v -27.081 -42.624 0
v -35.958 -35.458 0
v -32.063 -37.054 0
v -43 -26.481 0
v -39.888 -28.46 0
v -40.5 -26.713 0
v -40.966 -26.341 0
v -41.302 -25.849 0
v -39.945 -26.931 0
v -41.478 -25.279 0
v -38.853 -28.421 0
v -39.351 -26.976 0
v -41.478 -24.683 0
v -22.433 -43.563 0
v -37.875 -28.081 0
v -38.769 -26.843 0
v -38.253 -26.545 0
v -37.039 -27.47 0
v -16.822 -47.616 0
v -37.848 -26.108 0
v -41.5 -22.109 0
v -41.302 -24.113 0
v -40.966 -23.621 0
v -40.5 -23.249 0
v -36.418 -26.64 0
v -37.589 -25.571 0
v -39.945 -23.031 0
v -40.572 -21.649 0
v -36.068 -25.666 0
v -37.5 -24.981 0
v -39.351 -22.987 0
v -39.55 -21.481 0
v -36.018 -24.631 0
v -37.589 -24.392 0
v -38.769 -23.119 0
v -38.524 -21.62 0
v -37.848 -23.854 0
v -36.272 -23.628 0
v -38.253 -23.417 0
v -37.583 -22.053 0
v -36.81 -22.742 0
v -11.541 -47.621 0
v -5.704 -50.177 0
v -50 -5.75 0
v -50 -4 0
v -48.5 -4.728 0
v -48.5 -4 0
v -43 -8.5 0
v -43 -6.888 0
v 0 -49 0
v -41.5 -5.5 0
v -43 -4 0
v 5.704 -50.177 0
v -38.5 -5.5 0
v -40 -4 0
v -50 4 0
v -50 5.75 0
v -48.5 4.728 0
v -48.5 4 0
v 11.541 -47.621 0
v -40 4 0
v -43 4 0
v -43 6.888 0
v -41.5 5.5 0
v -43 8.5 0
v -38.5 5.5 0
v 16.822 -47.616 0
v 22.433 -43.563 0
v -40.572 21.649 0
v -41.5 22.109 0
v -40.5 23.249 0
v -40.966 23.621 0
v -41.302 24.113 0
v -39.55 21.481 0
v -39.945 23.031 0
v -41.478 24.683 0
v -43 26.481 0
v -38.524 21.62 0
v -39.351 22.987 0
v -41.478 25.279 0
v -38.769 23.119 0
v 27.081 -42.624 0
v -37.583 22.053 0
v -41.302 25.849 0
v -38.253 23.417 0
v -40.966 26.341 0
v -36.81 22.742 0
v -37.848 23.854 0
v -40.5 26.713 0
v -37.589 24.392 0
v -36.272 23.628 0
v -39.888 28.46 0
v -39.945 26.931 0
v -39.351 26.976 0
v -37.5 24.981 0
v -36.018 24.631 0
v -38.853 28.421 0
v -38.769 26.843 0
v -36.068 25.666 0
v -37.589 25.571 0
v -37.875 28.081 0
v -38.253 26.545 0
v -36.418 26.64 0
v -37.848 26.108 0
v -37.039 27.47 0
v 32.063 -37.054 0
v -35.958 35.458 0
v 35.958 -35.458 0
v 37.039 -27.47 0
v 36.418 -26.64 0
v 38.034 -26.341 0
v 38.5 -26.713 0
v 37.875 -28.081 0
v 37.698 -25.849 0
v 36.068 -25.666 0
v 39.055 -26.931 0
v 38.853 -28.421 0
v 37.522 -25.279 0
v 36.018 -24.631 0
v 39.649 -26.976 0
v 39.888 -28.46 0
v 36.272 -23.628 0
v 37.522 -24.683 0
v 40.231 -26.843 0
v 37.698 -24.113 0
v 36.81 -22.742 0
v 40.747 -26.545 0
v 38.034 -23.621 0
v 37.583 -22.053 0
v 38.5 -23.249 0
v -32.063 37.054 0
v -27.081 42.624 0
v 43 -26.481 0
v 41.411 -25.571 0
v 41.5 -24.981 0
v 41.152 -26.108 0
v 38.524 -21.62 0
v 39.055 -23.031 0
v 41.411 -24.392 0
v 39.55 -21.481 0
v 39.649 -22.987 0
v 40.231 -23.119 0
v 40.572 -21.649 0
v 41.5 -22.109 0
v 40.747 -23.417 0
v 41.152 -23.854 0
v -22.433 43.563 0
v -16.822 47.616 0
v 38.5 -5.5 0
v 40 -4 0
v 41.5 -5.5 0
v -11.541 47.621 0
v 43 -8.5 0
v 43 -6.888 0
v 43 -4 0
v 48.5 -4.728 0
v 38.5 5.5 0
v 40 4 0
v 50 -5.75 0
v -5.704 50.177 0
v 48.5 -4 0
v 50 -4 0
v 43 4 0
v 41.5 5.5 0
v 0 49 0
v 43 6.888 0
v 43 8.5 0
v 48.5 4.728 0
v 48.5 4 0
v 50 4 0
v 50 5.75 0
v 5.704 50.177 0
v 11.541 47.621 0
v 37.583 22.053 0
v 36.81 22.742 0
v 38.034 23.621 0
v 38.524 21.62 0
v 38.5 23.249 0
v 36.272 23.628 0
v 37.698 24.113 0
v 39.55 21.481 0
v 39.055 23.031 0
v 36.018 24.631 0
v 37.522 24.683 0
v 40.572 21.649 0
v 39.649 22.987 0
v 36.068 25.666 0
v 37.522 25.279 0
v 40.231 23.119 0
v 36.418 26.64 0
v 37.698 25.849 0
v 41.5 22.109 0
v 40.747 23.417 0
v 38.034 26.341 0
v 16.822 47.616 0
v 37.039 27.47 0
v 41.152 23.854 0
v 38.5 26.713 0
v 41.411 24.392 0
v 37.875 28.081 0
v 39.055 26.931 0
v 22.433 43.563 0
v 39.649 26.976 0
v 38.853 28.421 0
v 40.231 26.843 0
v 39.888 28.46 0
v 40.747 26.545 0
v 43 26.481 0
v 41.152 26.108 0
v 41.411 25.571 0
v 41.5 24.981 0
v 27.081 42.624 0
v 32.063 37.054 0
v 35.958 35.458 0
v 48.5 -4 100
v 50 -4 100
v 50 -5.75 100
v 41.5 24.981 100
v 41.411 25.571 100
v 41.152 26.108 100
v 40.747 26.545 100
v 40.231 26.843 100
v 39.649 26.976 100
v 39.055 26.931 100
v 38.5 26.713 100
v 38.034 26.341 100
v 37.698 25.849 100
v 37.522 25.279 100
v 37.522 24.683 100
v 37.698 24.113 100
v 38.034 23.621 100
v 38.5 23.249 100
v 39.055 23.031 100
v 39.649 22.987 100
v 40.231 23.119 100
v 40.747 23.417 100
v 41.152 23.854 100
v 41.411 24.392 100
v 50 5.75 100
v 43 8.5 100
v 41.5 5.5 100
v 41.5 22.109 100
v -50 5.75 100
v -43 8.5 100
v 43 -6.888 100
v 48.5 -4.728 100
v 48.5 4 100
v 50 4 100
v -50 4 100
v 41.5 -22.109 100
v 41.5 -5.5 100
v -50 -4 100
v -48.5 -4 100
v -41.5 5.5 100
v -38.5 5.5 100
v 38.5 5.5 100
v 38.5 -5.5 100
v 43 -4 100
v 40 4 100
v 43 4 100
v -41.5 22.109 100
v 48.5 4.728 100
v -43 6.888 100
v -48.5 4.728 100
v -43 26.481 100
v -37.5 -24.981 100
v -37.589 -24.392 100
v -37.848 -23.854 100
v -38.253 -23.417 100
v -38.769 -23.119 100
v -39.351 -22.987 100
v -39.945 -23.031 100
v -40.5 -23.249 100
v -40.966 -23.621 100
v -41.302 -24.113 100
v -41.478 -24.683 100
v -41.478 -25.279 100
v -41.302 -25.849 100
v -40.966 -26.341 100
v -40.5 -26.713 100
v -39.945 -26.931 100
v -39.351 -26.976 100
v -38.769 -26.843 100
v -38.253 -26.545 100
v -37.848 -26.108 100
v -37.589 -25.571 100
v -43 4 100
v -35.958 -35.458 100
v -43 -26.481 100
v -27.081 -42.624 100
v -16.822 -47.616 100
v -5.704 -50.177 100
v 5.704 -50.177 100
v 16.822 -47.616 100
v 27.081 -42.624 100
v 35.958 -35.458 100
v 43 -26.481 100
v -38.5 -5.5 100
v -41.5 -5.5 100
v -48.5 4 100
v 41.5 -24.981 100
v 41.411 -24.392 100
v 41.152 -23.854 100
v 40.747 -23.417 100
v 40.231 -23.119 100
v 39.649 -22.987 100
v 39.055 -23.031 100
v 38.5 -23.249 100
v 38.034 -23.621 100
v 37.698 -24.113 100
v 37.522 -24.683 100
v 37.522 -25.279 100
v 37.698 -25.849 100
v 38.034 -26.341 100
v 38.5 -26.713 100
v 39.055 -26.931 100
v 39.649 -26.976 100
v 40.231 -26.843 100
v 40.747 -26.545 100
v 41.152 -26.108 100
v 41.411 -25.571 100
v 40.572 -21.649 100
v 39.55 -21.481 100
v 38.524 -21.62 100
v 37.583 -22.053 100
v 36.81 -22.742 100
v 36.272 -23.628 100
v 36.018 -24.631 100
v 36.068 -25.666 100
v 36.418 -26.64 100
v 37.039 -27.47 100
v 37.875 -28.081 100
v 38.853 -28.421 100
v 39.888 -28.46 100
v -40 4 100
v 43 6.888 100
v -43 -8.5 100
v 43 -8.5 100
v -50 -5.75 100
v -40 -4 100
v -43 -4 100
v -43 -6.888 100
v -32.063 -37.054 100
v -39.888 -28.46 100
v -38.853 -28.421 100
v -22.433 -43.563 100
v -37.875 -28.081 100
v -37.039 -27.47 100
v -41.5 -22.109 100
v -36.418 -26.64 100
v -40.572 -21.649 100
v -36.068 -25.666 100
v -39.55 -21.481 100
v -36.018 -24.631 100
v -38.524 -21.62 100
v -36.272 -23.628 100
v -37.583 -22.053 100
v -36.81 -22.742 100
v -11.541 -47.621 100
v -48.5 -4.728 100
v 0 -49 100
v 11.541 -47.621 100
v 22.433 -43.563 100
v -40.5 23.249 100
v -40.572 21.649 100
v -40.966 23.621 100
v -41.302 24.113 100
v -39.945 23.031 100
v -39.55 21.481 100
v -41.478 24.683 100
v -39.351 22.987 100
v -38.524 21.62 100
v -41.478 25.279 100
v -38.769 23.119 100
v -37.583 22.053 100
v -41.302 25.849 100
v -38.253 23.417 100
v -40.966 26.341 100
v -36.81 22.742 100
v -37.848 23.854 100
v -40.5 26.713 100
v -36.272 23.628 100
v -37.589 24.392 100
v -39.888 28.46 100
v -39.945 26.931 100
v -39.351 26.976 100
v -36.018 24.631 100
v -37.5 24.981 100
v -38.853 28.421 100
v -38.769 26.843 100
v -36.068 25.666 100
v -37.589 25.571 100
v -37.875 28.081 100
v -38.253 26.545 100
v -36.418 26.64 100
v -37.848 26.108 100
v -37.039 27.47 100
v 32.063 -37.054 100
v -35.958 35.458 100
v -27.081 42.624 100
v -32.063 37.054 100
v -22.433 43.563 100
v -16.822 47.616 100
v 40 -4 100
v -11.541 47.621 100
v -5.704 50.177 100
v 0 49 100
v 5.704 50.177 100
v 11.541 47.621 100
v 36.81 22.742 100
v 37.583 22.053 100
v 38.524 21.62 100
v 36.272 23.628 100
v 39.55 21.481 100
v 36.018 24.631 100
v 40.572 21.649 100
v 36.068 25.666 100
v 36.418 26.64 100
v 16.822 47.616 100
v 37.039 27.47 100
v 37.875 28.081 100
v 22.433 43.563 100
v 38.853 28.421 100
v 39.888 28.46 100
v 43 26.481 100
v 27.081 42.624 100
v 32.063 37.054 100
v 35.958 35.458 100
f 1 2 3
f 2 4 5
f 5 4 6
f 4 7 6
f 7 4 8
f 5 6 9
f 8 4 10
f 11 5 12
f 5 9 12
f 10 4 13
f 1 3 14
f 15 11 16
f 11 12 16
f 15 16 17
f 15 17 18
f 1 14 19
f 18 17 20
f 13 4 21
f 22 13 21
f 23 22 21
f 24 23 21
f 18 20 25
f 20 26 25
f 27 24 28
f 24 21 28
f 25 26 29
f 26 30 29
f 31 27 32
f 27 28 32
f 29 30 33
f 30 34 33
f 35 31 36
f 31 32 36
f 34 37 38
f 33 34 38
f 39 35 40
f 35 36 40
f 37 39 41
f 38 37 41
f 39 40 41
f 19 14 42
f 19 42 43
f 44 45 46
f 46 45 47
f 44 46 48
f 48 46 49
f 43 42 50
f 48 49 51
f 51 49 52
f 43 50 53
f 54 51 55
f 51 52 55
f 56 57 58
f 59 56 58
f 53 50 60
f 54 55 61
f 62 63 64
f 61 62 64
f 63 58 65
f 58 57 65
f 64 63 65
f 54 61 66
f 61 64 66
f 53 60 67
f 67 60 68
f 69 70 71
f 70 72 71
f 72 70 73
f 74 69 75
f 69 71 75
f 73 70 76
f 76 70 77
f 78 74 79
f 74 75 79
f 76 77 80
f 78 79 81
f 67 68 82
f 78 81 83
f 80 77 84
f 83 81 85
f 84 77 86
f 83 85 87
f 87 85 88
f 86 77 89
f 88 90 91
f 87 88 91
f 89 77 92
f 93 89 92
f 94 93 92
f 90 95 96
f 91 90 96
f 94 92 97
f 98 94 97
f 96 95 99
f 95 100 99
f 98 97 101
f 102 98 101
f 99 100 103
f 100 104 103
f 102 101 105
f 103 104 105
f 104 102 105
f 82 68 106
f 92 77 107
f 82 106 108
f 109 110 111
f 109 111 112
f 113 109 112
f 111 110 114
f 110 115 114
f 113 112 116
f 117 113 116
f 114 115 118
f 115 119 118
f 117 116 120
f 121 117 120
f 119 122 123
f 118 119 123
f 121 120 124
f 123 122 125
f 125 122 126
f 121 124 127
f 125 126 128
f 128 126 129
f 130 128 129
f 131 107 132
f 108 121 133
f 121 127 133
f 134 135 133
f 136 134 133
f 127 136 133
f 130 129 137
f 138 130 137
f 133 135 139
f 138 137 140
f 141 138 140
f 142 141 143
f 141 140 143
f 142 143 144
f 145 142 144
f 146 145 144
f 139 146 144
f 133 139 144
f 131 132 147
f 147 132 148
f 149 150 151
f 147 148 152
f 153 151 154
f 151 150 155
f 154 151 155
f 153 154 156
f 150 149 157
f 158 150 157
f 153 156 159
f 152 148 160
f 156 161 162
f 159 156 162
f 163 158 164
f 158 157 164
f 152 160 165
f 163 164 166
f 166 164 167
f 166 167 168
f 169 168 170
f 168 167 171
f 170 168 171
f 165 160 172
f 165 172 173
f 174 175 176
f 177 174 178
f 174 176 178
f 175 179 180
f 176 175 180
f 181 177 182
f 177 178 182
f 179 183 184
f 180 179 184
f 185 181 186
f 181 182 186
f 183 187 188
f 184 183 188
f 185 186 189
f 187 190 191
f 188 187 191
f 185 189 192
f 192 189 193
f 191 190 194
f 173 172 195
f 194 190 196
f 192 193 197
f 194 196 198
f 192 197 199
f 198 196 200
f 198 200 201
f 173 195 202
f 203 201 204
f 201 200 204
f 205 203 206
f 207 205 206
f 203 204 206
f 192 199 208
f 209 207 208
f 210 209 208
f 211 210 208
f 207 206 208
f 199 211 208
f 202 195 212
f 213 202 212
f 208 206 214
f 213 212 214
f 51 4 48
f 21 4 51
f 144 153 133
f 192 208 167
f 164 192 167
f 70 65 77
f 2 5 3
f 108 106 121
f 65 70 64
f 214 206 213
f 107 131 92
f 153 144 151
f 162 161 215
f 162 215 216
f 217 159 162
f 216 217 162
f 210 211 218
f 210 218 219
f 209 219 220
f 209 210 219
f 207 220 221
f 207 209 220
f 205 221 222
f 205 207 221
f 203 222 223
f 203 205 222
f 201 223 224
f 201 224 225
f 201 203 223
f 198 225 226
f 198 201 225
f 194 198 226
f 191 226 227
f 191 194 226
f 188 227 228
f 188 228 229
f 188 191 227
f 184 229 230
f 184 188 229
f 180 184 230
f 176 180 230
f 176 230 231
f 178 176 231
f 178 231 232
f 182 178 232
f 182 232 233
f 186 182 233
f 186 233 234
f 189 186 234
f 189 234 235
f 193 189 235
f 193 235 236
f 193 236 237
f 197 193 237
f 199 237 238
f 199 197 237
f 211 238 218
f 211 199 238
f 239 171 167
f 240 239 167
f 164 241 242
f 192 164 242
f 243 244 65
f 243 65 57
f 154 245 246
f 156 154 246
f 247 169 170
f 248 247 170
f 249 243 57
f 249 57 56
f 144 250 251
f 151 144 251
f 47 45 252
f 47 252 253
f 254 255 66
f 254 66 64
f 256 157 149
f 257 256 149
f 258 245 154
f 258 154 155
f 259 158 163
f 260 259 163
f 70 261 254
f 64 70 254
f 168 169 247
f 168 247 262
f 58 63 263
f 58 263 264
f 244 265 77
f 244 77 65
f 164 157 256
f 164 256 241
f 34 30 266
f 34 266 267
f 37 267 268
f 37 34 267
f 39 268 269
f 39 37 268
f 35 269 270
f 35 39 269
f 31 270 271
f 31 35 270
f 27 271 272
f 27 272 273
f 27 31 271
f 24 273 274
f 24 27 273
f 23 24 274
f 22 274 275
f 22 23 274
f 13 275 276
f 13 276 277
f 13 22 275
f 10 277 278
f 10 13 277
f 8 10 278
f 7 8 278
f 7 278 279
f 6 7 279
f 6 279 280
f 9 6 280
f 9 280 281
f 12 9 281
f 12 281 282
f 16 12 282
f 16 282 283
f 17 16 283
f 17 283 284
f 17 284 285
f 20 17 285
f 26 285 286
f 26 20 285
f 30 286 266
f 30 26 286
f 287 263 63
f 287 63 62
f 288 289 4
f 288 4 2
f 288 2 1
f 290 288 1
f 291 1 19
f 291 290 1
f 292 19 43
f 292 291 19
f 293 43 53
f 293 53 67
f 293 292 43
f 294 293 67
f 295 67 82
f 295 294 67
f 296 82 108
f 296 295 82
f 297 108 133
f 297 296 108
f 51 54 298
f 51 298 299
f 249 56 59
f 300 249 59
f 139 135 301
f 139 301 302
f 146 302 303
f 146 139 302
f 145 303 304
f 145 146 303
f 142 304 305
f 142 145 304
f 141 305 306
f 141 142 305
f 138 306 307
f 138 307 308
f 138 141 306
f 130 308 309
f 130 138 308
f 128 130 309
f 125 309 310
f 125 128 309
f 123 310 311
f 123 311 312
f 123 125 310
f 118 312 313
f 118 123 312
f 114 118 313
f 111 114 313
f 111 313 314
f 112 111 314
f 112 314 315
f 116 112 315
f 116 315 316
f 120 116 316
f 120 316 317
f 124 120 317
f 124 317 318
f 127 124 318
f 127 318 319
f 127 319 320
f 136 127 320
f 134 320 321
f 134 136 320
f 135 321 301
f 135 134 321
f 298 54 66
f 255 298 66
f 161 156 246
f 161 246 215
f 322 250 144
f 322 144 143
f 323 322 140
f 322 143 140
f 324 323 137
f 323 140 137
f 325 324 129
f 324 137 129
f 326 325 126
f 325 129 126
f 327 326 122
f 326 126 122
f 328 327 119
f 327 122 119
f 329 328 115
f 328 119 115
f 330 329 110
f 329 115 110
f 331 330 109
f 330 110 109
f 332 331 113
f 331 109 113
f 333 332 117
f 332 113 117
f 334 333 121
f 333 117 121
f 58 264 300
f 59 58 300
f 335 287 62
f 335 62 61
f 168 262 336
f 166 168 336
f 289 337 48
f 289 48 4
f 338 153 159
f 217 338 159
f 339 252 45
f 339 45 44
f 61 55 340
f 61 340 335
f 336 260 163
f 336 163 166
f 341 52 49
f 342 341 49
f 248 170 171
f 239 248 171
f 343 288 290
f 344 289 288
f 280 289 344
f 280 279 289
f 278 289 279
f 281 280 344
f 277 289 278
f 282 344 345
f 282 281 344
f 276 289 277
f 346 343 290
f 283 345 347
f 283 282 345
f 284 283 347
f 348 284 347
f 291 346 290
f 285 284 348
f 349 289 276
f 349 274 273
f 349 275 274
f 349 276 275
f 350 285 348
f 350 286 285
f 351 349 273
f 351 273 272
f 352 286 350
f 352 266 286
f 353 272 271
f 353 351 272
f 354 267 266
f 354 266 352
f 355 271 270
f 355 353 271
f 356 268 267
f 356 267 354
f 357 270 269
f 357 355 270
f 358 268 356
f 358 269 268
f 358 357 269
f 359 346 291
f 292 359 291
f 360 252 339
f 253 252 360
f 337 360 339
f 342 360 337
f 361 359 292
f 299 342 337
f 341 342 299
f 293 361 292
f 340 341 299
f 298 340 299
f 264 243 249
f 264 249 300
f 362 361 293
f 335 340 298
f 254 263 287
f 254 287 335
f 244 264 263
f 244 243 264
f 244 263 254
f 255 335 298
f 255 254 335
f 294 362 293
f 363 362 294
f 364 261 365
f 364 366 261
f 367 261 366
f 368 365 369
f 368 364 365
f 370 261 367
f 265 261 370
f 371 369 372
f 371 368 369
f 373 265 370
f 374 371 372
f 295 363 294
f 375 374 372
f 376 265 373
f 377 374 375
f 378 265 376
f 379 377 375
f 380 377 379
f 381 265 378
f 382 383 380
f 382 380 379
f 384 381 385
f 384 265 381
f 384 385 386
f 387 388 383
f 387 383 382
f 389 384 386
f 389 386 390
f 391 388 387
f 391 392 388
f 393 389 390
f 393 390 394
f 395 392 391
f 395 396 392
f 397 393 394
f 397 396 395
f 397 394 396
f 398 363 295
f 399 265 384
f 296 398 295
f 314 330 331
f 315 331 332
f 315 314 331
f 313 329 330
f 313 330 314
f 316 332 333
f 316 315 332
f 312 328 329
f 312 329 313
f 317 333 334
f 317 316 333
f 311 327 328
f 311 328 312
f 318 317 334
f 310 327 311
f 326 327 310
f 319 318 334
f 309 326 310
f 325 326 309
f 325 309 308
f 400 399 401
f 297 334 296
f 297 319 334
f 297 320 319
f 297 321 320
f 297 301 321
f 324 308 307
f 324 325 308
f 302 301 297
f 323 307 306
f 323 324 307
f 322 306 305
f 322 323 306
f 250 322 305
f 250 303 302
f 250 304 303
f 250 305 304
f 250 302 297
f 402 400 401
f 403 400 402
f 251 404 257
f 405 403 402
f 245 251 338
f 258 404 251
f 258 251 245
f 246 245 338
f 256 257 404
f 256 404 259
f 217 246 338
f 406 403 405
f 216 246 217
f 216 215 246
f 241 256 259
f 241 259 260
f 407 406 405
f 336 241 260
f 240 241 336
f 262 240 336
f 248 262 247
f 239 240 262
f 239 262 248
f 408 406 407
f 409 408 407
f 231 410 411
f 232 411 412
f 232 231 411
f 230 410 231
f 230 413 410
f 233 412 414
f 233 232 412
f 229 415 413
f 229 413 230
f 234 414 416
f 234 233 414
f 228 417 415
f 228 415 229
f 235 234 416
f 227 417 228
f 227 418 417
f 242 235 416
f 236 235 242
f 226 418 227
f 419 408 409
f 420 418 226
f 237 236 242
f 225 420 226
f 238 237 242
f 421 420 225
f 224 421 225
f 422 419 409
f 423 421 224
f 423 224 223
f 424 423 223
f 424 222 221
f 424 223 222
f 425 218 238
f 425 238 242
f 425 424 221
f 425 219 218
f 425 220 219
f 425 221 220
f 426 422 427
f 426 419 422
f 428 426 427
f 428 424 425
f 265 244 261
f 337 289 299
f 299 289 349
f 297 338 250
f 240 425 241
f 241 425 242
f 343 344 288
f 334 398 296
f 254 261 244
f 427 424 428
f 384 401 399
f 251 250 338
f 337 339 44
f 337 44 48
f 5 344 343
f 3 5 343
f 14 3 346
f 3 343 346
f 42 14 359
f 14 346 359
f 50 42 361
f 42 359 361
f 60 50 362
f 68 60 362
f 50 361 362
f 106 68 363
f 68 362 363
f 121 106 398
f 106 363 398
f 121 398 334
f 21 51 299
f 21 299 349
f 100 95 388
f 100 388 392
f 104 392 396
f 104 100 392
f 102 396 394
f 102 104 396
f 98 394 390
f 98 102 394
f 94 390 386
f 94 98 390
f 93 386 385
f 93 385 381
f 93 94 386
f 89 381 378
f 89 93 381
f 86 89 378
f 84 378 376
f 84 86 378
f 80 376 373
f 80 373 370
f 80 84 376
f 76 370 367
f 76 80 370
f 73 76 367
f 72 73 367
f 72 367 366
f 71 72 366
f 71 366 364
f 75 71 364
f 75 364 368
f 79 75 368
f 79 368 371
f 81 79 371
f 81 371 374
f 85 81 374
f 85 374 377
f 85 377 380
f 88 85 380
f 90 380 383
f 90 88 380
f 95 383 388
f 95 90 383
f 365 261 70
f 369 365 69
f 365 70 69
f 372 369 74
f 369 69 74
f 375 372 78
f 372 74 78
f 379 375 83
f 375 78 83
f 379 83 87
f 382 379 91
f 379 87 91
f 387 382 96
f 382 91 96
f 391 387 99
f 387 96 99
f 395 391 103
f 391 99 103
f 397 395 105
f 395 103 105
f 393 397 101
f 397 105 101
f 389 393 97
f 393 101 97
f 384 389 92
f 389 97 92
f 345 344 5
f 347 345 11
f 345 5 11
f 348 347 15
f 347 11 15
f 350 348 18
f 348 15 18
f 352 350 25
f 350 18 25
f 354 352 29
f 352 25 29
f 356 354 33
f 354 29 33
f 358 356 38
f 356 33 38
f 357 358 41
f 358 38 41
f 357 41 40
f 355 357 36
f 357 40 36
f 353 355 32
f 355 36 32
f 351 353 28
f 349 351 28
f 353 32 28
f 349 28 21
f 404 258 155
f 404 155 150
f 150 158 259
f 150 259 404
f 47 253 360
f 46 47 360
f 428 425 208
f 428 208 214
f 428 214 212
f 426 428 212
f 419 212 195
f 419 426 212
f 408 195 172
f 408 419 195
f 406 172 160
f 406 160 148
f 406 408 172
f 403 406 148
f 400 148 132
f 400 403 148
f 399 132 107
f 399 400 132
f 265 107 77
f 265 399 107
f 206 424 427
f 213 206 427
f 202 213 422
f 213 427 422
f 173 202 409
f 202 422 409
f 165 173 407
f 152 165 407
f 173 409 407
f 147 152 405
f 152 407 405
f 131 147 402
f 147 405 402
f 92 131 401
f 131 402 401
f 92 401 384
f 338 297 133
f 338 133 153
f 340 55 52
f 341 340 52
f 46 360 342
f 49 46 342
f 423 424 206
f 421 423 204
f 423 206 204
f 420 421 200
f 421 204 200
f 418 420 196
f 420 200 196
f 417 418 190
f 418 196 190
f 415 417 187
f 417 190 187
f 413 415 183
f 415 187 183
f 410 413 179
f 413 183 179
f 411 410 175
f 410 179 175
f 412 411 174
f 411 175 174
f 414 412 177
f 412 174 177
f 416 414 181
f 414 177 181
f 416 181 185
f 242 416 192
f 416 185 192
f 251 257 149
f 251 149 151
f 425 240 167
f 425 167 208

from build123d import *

# Parameters (mm, degrees)
F0_R          = 2
F1_DEPTH      = 100
F1_DEPTH_BACK = 1.5
F2_T          = 1.5
F2_T3_DEPTH   = 104.5
F0_W          = 7
F0_H          = 1.75
F0_H_2        = 8
F0_W_2        = 3
F3_DEPTH      = 100
F3_DEPTH_BACK = 1.5
F4_T          = 1.5
F4_T3_DEPTH   = 104.5
F4_T5_DEPTH   = 103
F4_T7_DEPTH   = 19.6088440305
F4_T9_DEPTH   = 6
F4_T11_DEPTH  = 14
F4_T13_DEPTH  = 19.6088440305
F4_T15_DEPTH  = 6
F4_T18_ANGLE  = 221.2149297422
F4_T20_ANGLE  = 108.9853327241
F4_T22_ANGLE  = 221.2149297422
F4_T24_ANGLE  = 221.2149297422
F4_T26_ANGLE  = 108.9853327241
F4_T28_ANGLE  = 221.2149297422
F0_W_3        = 2
F5_DEPTH      = 1.5
F6_DEPTH      = 100
F6_DEPTH_BACK = 1.5


# Not quite as in the source:
# - a shell that OpenCascade refuses in one call is made with other operations: the cavity is built on its own and cut out


with BuildPart() as f1:
    # F0 (on Top) → F1 (new body, two sides)
    with BuildSketch(Plane.XY) as f1_sk:
        with BuildLine():
            Line((43, 8.5), (43, 26.4811253537))
            ThreePointArc((43, 26.4811253537), (0, 50.5), (-43, 26.4811253537))
            Line((-43, 26.4811253537), (-43, 8.5))
            Line((-43, 8.5), (-43, 5.75))
            Line((-43, 5.75), (-43, 4))
            Line((-43, 4), (-40, 4))
            Line((-40, 4), (-40, -4))
            Line((-40, -4), (-43, -4))
            Line((-43, -4), (-43, -5.75))
            Line((-43, -5.75), (-43, -8.5))
            Line((-43, -8.5), (-43, -26.4811253537))
            ThreePointArc((-43, -26.4811253537), (0, -50.5), (43, -26.4811253537))
            Line((43, -26.4811253537), (43, -8.5))
            Line((43, -8.5), (43, -5.75))
            Line((43, -5.75), (43, -4))
            Line((43, -4), (40, -4))
            Line((40, -4), (40, 4))
            Line((40, 4), (43, 4))
            Line((43, 4), (43, 5.75))
            Line((43, 5.75), (43, 8.5))
        make_face()
        with Locations((-39.5, -24.9811253537)):
            Circle(F0_R, mode=Mode.SUBTRACT)
        with Locations((39.5, -24.9811253537)):
            Circle(F0_R, mode=Mode.SUBTRACT)
        with Locations((-39.5, 24.9811253537)):
            Circle(F0_R, mode=Mode.SUBTRACT)
        with Locations((39.5, 24.9811253537)):
            Circle(F0_R, mode=Mode.SUBTRACT)
    extrude(amount=F1_DEPTH)
    extrude(f1_sk.sketch, amount=-F1_DEPTH_BACK)

    # F2: shell of thickness 1.5, made by hand


with BuildPart() as f2_core1:
    # F2_t2: copy of F1
    add(f1.part)

    # the walls: a layer under each face that stays
    f2_faces = [f2_core1.faces().sort_by_distance(p)[0] for p in [
        (43, -15.2405626769, 49.25),
        (0, 0, -1.5),
        (37.5, 24.9811253537, 49.25),
        (-41.5, 24.9811253537, 49.25),
        (37.5, -24.9811253537, 49.25),
        (-41.5, -24.9811253537, 49.25),
        (-43, -15.2405626769, 49.25),
        (-41.5, -4, 49.25),
        (-40, 0, 49.25),
        (-41.5, 4, 49.25),
        (-43, 15.2405626769, 49.25),
        (0, 50.5, 49.25),
        (43, 15.2405626769, 49.25),
        (41.5, 4, 49.25),
        (40, 0, 49.25),
        (41.5, -4, 49.25),
        (0, -50.5, 49.25),
    ]]
    thicken(f2_faces, amount=-F2_T, mode=Mode.SUBTRACT)

    # F2_s4 → F2_t3 (cut)
    with BuildSketch(Plane.XY.offset(-3)):
        Polygon((-40.015, -3.985), (-40, -5.5), (-38.5, -5.5), (-38.5, -4), align=None)
        Polygon((-40.015, 3.985), (-38.5, 4), (-38.5, 5.5), (-40, 5.5), align=None)
        Polygon((40.015, 3.985), (40, 5.5), (38.5, 5.5), (38.5, 4), align=None)
        Polygon((40.015, -3.985), (38.5, -4), (38.5, -5.5), (40, -5.5), align=None)
    extrude(amount=F2_T3_DEPTH, mode=Mode.SUBTRACT)


with BuildPart() as f1_1:
    add(f1.part)

    # what is left inside the walls is the cavity
    f2_cavity = [f2_core1.part.solids().sort_by_distance(p)[0] for p in [
        (0, -48.985, 66.666667),
    ]]
    add(f2_cavity, mode=Mode.SUBTRACT)

    # F0 (on Top) → F3 (join, two sides)
    with BuildSketch(Plane.XY) as f3_sk:
        Polygon((-43, 5.75), (-43, 8.5), (-50, 5.75), align=None)
        with Locations((-46.5, 4.875)):
            Rectangle(F0_W, F0_H)
        with Locations((-46.5, 0)):
            Rectangle(F0_W, F0_H_2)
        with Locations((-46.5, -4.875)):
            Rectangle(F0_W, F0_H)
        Polygon((-43, -8.5), (-43, -5.75), (-50, -5.75), align=None)
        with Locations((-41.5, 0)):
            Rectangle(F0_W_2, F0_H_2)
        Polygon((50, -5.75), (43, -5.75), (43, -8.5), align=None)
        with Locations((46.5, -4.875)):
            Rectangle(F0_W, F0_H)
        with Locations((46.5, 0)):
            Rectangle(F0_W, F0_H_2)
        with Locations((41.5, 0)):
            Rectangle(F0_W_2, F0_H_2)
        Polygon((50, 5.75), (43, 8.5), (43, 5.75), align=None)
        with Locations((46.5, 4.875)):
            Rectangle(F0_W, F0_H)
    extrude(amount=F3_DEPTH)
    extrude(f3_sk.sketch, amount=-F3_DEPTH_BACK)

    # F4: shell of thickness 1.5, made by hand


with BuildPart() as f4_core1:
    # F4_t2: copy of F1
    add(f1_1.part)

    # the walls: a layer under each face that stays
    f4_faces = [f4_core1.faces().sort_by_distance(p)[0] for p in [
        (43, -17.4905626769, 49.25),
        (0, -50.5, 49.25),
        (0, 0, -1.5),
        (46.5, -7.125, 49.25),
        (-43, -17.4905626769, 49.25),
        (43, 17.4905626769, 49.25),
        (0, 50.5, 49.25),
        (-43, 17.4905626769, 49.25),
        (-41.5, -24.9811253537, 49.25),
        (37.5, -24.9811253537, 49.25),
        (-41.5, 24.9811253537, 49.25),
        (37.5, 24.9811253537, 49.25),
        (50, 0, 49.25),
        (41.5, -13.8044220152, 50),
        (40, -5.5, 50),
        (38.5, 0, 50),
        (40, 5.5, 50),
        (41.5, 13.8044220152, 50),
        (36.1075781641, 24.1200364574, 50),
        (0, 49, 50),
        (-36.1075781641, 24.1200364574, 50),
        (-41.5, 13.8044220152, 50),
        (-40, 5.5, 50),
        (-38.5, 0, 50),
        (-40, -5.5, 50),
        (-41.5, -13.8044220152, 50),
        (-36.1075781641, -24.1200364574, 50),
        (0, -49, 50),
        (36.1075781641, -24.1200364574, 50),
        (-46.5, -7.125, 49.25),
        (46.5, 7.125, 49.25),
        (-46.5, 7.125, 49.25),
        (-50, 0, 49.25),
        (0, 0, 0),
    ]]
    thicken(f4_faces, amount=-F4_T, mode=Mode.SUBTRACT)

    # F4_s4 → F4_t3 (cut)
    with BuildSketch(Plane.XY.offset(-3)):
        Polygon((43.0204847856, -8.5139612724), (41.5, -8.5), (41.5, -7.4776847547), (42.4515214414, -7.1038727598), align=None)
        Polygon((-43.0204847856, -8.5139612724), (-41.5, -8.5), (-41.5, -7.4776847547), (-42.4515214414, -7.1038727598), align=None)
        Polygon((43.0204847856, 8.5139612724), (41.5, 8.5), (41.5, 7.4776847547), (42.4515214414, 7.1038727598), align=None)
        Polygon((-43.0204847856, 8.5139612724), (-41.5, 8.5), (-41.5, 7.4776847547), (-42.4515214414, 7.1038727598), align=None)
    extrude(amount=F4_T3_DEPTH, mode=Mode.SUBTRACT)

    # F4_s6 → F4_t5 (cut)
    with BuildSketch(Plane.XY.offset(-1.5)):
        Polygon((41.4935714286, -22.0965342534), (43, -22.1088440305), (43, -24.9811253537), (40.6428571429, -23.3398217404), align=None)
        Polygon((41.485, -5.515), (43, -5.5), (43, -4), (41.5, -4), align=None)
        Polygon((41.485, 5.515), (41.5, 4), (43, 4), (43, 5.5), align=None)
        Polygon((41.4935714286, 22.0965342534), (43, 22.1088440305), (43, 24.9811253537), (40.6428571429, 23.3398217404), align=None)
        Polygon((39.8774703303, 28.4657460045), (39.7217245792, 26.9687969088), (43.0599998648, 26.5964126076), (41.1090797896, 29.330761307), align=None)
        Polygon((-39.8774703303, 28.4657460045), (-41.1090797896, 29.330761307), (-43.0599998648, 26.5964126076), (-39.7217245792, 26.9687969088), align=None)
        Polygon((-41.4935714286, 22.0965342534), (-40.6428571429, 23.3398217404), (-43, 24.9811253537), (-43, 22.1088440305), align=None)
        Polygon((-41.485, 5.515), (-43, 5.5), (-43, 4), (-41.5, 4), align=None)
        Polygon((-41.485, -5.515), (-41.5, -4), (-43, -4), (-43, -5.5), align=None)
        Polygon((-41.4935714286, -22.0965342534), (-43, -22.1088440305), (-43, -24.9811253537), (-40.6428571429, -23.3398217404), align=None)
        Polygon((-39.8774703303, -28.4657460045), (-39.7217245792, -26.9687969088), (-43.0599998648, -26.5964126076), (-41.1090797896, -29.330761307), align=None)
        Polygon((39.8774703303, -28.4657460045), (41.1090797896, -29.330761307), (43.0599998648, -26.5964126076), (39.7217245792, -26.9687969088), align=None)
    extrude(amount=F4_T5_DEPTH, mode=Mode.SUBTRACT)

    # F4_s8 → F4_t7 (cut)
    with BuildSketch(Plane.XZ.offset(4)):
        Polygon((41.485, 0.015), (43, 0), (43, -1.5), (41.5, -1.5), align=None)
        Polygon((-41.485, 0.015), (-43, 0), (-43, -1.5), (-41.5, -1.5), align=None)
    extrude(amount=F4_T7_DEPTH, mode=Mode.SUBTRACT)

    # F4_s10 → F4_t9 (cut)
    with BuildSketch(Plane.YZ.offset(37)):
        Polygon((-5.515, 0.015), (-4, 0), (-4, -1.5), (-5.5, -1.5), align=None)
        Polygon((5.515, 0.015), (4, 0), (4, -1.5), (5.5, -1.5), align=None)
    extrude(amount=F4_T9_DEPTH, mode=Mode.SUBTRACT)

    # F4_s12 → F4_t11 (cut)
    with BuildSketch(Plane.XZ.offset(-7)):
        Polygon((38.485, 0.015), (40, 0), (40, -1.5), (38.5, -1.5), align=None)
        Polygon((-38.485, 0.015), (-40, 0), (-40, -1.5), (-38.5, -1.5), align=None)
    extrude(amount=F4_T11_DEPTH, mode=Mode.SUBTRACT)

    # F4_s14 → F4_t13 (cut)
    with BuildSketch(Plane.XZ.offset(-23.6088440305)):
        Polygon((41.485, 0.015), (43, 0), (43, -1.5), (41.5, -1.5), align=None)
        Polygon((-41.485, 0.015), (-43, 0), (-43, -1.5), (-41.5, -1.5), align=None)
    extrude(amount=F4_T13_DEPTH, mode=Mode.SUBTRACT)

    # F4_s16 → F4_t15 (cut)
    with BuildSketch(Plane.YZ.offset(-43)):
        Polygon((5.515, 0.015), (4, 0), (4, -1.5), (5.5, -1.5), align=None)
        Polygon((-5.515, 0.015), (-4, 0), (-4, -1.5), (-5.5, -1.5), align=None)
    extrude(amount=F4_T15_DEPTH, mode=Mode.SUBTRACT)

    # F4_s17 → F4_t18 (revolve, cut)
    with BuildSketch(Plane(origin=(38.3167869041, 26.6803857921, 0), x_dir=(0, 0, 1), z_dir=(0.8206518066, 0.5714285714, 0))):
        Polygon((0.015, 5.5856229178), (0, 4.0706229178), (-1.5, 4.0706229178), (-1.5, 5.5706229178), align=None)
    revolve(axis=Axis((39.5, 24.9811253537, 0), (0, 0, -1)), revolution_arc=F4_T18_ANGLE, mode=Mode.SUBTRACT)

    # F4_s19 → F4_t20 (revolve, cut)
    with BuildSketch(Plane(origin=(0, 0, 0), x_dir=(0, 0, 1), z_dir=(-0.5808071546, -0.814041184, 0))):
        Polygon((0.015, 48.985), (0, 50.5), (-1.5, 50.5), (-1.5, 49), align=None)
    revolve(axis=Axis((0, 0, 0), (0, 0, -1)), revolution_arc=F4_T20_ANGLE, mode=Mode.SUBTRACT)

    # F4_s21 → F4_t22 (revolve, cut)
    with BuildSketch(Plane(origin=(-38.3167869041, 26.6803857921, 0), x_dir=(0, 0, 1), z_dir=(-0.8206518066, 0.5714285714, 0))):
        Polygon((0.015, -5.5856229178), (0, -4.0706229178), (-1.5, -4.0706229178), (-1.5, -5.5706229178), align=None)
    revolve(axis=Axis((-39.5, 24.9811253537, 0), (0, 0, 1)), revolution_arc=F4_T22_ANGLE, mode=Mode.SUBTRACT)

    # F4_s23 → F4_t24 (revolve, cut)
    with BuildSketch(Plane(origin=(-36.2621341759, 4.0450377338, 0), x_dir=(0, 0, 1), z_dir=(-0.9938357776, 0.1108622896, 0))):
        Polygon((0.015, -32.7211965802), (0, -31.2061965802), (-1.5, -31.2061965802), (-1.5, -32.7061965802), align=None)
    revolve(axis=Axis((-39.5, -24.9811253537, 0), (0, 0, 1)), revolution_arc=F4_T24_ANGLE, mode=Mode.SUBTRACT)

    # F4_s25 → F4_t26 (revolve, cut)
    with BuildSketch(Plane(origin=(0, 0, 0), x_dir=(0, 0, 1), z_dir=(0.5808071546, 0.814041184, 0))):
        Polygon((0.015, 48.985), (0, 50.5), (-1.5, 50.5), (-1.5, 49), align=None)
    revolve(axis=Axis((0, 0, 0), (0, 0, -1)), revolution_arc=F4_T26_ANGLE, mode=Mode.SUBTRACT)

    # F4_s27 → F4_t28 (revolve, cut)
    with BuildSketch(Plane(origin=(36.2621341759, 4.0450377338, 0), x_dir=(0, 0, 1), z_dir=(0.9938357776, 0.1108622896, 0))):
        Polygon((0.015, 32.7211965802), (0, 31.2061965802), (-1.5, 31.2061965802), (-1.5, 32.7061965802), align=None)
    revolve(axis=Axis((39.5, -24.9811253537, 0), (0, 0, -1)), revolution_arc=F4_T28_ANGLE, mode=Mode.SUBTRACT)


with BuildPart() as f1_2:
    add(f1_1.part)

    # what is left inside the walls is the cavity
    f4_cavity = [f4_core1.part.solids().sort_by_distance(p)[0] for p in [
        (48.485, 0, 66.666667),
        (-48.485, 0, 66.666667),
    ]]
    add(f4_cavity, mode=Mode.SUBTRACT)

    # F0 (on Top) → F5 (cut)
    with BuildSketch(Plane.XY):
        with Locations((-51, 0)):
            Rectangle(F0_W_3, F0_H_2)
        with Locations((-46.5, 0)):
            Rectangle(F0_W, F0_H_2)
        with Locations((-46.5, 4.875)):
            Rectangle(F0_W, F0_H)
        Polygon((-43, 5.75), (-43, 8.5), (-50, 5.75), align=None)
        with Locations((-41.5, 0)):
            Rectangle(F0_W_2, F0_H_2)
        Polygon((-43, -8.5), (-43, -5.75), (-50, -5.75), align=None)
        with BuildLine():
            Line((43, 8.5), (43, 26.4811253537))
            ThreePointArc((43, 26.4811253537), (0, 50.5), (-43, 26.4811253537))
            Line((-43, 26.4811253537), (-43, 8.5))
            Line((-43, 8.5), (-43, 5.75))
            Line((-43, 5.75), (-43, 4))
            Line((-43, 4), (-40, 4))
            Line((-40, 4), (-40, -4))
            Line((-40, -4), (-43, -4))
            Line((-43, -4), (-43, -5.75))
            Line((-43, -5.75), (-43, -8.5))
            Line((-43, -8.5), (-43, -26.4811253537))
            ThreePointArc((-43, -26.4811253537), (0, -50.5), (43, -26.4811253537))
            Line((43, -26.4811253537), (43, -8.5))
            Line((43, -8.5), (43, -5.75))
            Line((43, -5.75), (43, -4))
            Line((43, -4), (40, -4))
            Line((40, -4), (40, 4))
            Line((40, 4), (43, 4))
            Line((43, 4), (43, 5.75))
            Line((43, 5.75), (43, 8.5))
        make_face()
        with Locations((-39.5, -24.9811253537)):
            Circle(F0_R, mode=Mode.SUBTRACT)
        with Locations((39.5, -24.9811253537)):
            Circle(F0_R, mode=Mode.SUBTRACT)
        with Locations((-39.5, 24.9811253537)):
            Circle(F0_R, mode=Mode.SUBTRACT)
        with Locations((39.5, 24.9811253537)):
            Circle(F0_R, mode=Mode.SUBTRACT)
        with Locations((41.5, 0)):
            Rectangle(F0_W_2, F0_H_2)
        with Locations((46.5, 0)):
            Rectangle(F0_W, F0_H_2)
        with Locations((46.5, 4.875)):
            Rectangle(F0_W, F0_H)
        Polygon((50, 5.75), (43, 8.5), (43, 5.75), align=None)
        Polygon((50, -5.75), (43, -5.75), (43, -8.5), align=None)
        with Locations((46.5, -4.875)):
            Rectangle(F0_W, F0_H)
        with Locations((51, 0)):
            Rectangle(F0_W_3, F0_H_2)
        with Locations((-46.5, -4.875)):
            Rectangle(F0_W, F0_H)
        with Locations((-39.5, 24.9811253537)):
            Circle(F0_R)
        with Locations((39.5, 24.9811253537)):
            Circle(F0_R)
        with Locations((39.5, -24.9811253537)):
            Circle(F0_R)
        with Locations((-39.5, -24.9811253537)):
            Circle(F0_R)
    extrude(amount=-F5_DEPTH, mode=Mode.SUBTRACT)

    # F0 (on Top) → F6 (cut, two sides)
    with BuildSketch(Plane.XY) as f6_sk:
        with Locations((-46.5, 0)):
            Rectangle(F0_W, F0_H_2)
        with Locations((46.5, 0)):
            Rectangle(F0_W, F0_H_2)
    extrude(amount=F6_DEPTH, mode=Mode.SUBTRACT)
    extrude(f6_sk.sketch, amount=-F6_DEPTH_BACK, mode=Mode.SUBTRACT)


solid = f1_2.part
